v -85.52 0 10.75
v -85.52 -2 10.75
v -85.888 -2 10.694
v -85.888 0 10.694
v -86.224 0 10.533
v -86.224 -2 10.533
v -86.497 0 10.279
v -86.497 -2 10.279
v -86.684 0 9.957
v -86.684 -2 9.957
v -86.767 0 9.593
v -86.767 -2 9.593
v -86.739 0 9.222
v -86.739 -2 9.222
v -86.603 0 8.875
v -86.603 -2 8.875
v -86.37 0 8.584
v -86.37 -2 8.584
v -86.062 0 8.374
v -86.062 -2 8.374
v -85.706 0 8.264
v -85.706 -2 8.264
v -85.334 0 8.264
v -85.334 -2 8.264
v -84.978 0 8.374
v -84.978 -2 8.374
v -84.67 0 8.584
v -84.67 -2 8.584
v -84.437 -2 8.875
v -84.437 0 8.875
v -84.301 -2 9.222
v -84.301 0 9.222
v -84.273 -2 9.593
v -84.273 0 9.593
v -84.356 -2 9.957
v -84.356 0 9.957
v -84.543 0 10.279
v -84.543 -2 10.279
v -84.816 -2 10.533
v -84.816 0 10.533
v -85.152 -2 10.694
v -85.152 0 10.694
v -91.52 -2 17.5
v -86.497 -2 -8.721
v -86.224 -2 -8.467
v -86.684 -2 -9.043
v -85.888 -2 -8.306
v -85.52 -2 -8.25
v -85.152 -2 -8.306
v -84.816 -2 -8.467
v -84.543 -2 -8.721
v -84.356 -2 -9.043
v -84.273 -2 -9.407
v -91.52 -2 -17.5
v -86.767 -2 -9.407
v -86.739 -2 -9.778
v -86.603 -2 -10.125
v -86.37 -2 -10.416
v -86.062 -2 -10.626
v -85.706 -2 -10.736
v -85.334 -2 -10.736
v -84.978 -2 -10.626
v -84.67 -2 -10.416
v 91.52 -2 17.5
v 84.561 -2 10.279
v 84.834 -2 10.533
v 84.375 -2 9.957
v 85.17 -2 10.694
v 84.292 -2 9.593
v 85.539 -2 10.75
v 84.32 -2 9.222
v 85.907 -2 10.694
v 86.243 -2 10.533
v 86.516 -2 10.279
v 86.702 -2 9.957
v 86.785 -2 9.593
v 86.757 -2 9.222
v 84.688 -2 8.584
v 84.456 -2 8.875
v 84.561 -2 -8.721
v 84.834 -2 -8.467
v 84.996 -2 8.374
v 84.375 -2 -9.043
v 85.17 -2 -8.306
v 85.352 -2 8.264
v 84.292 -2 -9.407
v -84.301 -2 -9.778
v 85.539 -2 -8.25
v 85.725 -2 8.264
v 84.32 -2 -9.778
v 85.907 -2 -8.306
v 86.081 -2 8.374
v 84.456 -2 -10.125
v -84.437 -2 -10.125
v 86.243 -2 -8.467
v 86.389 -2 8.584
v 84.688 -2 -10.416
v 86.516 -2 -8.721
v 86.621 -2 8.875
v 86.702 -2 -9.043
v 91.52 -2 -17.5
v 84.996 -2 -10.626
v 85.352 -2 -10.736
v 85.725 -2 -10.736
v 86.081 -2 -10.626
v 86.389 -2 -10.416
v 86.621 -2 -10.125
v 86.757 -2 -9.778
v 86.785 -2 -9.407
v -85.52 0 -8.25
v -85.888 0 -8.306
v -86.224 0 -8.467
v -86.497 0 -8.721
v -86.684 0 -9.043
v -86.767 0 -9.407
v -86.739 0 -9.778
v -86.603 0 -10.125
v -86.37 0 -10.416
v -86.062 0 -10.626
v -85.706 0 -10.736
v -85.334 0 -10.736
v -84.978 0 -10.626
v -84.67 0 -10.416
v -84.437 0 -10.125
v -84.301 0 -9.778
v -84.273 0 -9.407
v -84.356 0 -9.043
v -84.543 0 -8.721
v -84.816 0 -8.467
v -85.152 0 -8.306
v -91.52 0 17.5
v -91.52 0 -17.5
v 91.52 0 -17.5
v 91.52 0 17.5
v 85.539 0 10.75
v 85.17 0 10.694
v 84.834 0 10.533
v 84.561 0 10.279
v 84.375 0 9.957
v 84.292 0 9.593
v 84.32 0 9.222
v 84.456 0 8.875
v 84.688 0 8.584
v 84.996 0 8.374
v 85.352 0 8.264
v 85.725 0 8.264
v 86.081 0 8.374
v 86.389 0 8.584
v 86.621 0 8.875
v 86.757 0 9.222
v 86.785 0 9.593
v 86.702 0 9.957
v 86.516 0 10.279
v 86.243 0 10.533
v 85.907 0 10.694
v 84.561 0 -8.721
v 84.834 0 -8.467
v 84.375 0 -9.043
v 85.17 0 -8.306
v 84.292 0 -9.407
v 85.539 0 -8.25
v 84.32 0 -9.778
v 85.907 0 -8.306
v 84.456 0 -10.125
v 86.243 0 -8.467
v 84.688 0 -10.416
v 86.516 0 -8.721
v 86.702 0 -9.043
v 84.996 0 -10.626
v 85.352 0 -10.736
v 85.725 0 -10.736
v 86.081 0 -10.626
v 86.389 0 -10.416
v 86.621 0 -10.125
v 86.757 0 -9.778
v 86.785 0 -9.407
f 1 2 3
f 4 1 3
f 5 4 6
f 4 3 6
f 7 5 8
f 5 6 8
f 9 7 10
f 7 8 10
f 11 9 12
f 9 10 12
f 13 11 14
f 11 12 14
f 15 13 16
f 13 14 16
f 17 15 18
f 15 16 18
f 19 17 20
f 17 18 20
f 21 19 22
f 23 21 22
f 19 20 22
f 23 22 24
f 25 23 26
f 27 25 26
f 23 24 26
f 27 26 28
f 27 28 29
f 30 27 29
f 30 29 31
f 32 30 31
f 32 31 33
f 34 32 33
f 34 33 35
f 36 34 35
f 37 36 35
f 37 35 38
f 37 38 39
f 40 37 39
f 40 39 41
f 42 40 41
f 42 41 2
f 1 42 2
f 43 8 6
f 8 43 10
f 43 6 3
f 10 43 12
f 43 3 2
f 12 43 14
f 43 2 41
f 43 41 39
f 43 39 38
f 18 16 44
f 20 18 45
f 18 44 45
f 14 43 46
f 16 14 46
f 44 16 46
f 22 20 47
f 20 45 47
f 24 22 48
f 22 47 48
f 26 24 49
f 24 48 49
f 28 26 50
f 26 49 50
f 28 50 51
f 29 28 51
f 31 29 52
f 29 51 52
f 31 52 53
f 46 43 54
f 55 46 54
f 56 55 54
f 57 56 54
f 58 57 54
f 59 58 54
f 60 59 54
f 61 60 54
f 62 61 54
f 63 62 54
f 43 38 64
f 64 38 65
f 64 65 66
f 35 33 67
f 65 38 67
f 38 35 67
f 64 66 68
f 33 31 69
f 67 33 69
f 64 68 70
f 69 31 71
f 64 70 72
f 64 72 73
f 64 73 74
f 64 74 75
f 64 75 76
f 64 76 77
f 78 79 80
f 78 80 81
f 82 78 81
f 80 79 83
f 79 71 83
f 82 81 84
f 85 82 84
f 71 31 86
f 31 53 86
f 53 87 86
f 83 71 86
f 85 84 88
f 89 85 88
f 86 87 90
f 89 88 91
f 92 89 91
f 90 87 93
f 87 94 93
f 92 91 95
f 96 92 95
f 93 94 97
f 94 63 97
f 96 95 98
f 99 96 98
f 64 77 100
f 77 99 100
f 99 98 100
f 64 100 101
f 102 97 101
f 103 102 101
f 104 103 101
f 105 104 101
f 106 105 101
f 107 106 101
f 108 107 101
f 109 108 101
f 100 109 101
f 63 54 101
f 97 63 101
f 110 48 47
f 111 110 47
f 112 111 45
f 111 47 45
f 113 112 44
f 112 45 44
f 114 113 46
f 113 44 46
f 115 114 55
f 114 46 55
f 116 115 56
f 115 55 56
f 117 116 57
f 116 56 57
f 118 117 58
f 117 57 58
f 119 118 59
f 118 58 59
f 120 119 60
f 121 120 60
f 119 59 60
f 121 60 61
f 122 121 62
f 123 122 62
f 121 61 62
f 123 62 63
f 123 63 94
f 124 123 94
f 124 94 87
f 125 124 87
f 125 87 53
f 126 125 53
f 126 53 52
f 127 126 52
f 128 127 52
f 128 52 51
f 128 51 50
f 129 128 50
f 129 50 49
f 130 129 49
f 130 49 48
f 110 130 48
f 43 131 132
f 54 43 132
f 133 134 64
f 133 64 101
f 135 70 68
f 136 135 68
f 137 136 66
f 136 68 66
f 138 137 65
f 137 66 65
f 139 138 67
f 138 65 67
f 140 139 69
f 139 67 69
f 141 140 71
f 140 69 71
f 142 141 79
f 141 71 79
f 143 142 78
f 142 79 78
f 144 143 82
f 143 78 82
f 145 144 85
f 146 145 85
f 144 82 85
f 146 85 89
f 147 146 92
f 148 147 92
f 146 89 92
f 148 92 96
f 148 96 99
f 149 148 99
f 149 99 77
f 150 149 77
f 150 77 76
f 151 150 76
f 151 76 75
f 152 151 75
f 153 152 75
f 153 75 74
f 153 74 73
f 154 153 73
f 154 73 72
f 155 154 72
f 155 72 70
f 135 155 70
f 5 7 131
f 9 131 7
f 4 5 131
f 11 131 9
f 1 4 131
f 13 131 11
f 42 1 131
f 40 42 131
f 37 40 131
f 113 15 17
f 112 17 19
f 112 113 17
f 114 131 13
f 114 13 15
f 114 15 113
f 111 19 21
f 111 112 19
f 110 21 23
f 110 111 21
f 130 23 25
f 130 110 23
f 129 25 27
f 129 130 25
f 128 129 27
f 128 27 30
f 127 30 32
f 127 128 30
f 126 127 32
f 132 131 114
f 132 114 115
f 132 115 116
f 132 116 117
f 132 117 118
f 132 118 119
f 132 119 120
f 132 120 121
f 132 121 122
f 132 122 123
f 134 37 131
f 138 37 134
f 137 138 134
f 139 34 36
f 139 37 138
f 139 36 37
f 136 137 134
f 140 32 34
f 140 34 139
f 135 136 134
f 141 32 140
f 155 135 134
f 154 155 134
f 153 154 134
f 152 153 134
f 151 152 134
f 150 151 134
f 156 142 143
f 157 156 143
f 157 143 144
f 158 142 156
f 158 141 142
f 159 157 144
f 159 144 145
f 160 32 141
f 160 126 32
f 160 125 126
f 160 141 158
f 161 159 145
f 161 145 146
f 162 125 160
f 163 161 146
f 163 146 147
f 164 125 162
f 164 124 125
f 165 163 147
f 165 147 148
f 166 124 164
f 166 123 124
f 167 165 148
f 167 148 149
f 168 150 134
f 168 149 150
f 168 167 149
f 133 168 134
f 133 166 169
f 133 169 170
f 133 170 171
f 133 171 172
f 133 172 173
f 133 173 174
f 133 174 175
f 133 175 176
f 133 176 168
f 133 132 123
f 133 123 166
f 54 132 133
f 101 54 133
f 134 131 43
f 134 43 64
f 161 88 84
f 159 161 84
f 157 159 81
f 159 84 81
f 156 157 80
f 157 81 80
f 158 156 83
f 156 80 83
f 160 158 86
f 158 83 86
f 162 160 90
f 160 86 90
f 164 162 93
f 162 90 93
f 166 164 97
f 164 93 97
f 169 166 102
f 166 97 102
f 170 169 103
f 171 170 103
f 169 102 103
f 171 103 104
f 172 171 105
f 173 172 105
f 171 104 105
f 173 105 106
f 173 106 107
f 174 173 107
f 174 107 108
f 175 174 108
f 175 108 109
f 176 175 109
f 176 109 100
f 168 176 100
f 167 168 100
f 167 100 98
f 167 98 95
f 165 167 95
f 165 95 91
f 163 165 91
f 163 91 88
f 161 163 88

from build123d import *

# Parameters (mm, degrees)
SKETCH1_W               = 183.04
SKETCH1_H               = 35
BASE_FLANGE1_DEPTH      = 2
TAP_DRILL_FOR_M3_TAP1_D = 2.5
TAP_DRILL_FOR_M3_TAP2_D = 2.5


# Sheet-metal steps are written as plain solids
with BuildPart() as part:
    # Sketch1 → Base-Flange1 (new body)
    with BuildSketch(Plane(origin=(0, 0, 0), x_dir=(1, 0, 0), z_dir=(0, 1, 0))):
        Rectangle(SKETCH1_W, SKETCH1_H)
    extrude(amount=-BASE_FLANGE1_DEPTH)

    # Tap Drill for M3 Tap1 (through all)
    with Locations(Plane(origin=(-65.865910354, 2, 15.830402425), x_dir=(0, 0, -1), z_dir=(0, 1, 0))):
        with Locations((25.330402425, 19.654089646), (6.330402425, 19.654089646)):
            Hole(TAP_DRILL_FOR_M3_TAP1_D / 2)

    # Tap Drill for M3 Tap2 (through all)
    with Locations(Plane(origin=(-65.865910354, 2, 15.830402425), x_dir=(0, 0, -1), z_dir=(0, 1, 0))):
        with Locations((25.330402425, -151.404413252), (6.330402425, -151.404413252)):
            Hole(TAP_DRILL_FOR_M3_TAP2_D / 2)


solid = part.part
